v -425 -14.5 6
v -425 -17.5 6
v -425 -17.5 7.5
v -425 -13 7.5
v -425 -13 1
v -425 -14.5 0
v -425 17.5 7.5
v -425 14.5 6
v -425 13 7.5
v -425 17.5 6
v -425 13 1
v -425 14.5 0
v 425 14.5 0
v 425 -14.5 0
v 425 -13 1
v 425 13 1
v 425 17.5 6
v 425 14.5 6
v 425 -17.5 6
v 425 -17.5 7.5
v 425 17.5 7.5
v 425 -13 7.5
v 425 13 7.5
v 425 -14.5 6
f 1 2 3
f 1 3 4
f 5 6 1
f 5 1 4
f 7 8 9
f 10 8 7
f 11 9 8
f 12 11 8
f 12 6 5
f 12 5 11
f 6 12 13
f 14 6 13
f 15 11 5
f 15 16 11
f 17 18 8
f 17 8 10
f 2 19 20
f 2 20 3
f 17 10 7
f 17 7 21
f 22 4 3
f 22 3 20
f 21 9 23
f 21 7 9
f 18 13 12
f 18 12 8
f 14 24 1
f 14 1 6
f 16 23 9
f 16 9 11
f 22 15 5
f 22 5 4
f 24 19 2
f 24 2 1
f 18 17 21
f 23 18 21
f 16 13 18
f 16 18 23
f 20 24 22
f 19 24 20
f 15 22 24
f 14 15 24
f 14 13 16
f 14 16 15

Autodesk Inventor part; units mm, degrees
ref_plane "YZ Plane" through (0, 0, 0) normal (1, 0, 0) x (0, 1, 0)
ref_plane "XZ Plane" through (0, 0, 0) normal (0, 1, 0) x (-1, 0, 0)
ref_plane "XY Plane" through (0, 0, 0) normal (0, 0, 1) x (1, 0, 0)
sketch "草圖1" plane through (0, 0, 0) normal (0, 0, 1) x (1, 0, 0)
  line L0 (-425, 17.5) -> (425, 17.5)
  line L1 (425, 17.5) -> (425, -17.5)
  line L2 (425, -17.5) -> (-425, -17.5)
  line L3 (-425, -17.5) -> (-425, 17.5)
  point P0 (0, 0)
  dimension "d0" = 850
  dimension "d1" = 35
  dimension "d2" = 17.5
  dimension "d3" = 425
extrude "擠出1" add sketch "草圖1" along normal blind 7.5
sketch "草圖2" plane through (425, -17.5, 0) normal (1, 0, 0) x (0, 0, -1)
  line L0 (0, 35) -> (-7.5, 35) projected
  line L1 (0, 0) -> (0, 35) projected
  line L2 (-6, 35) -> (0, 35)
  line L3 (0, 35) -> (0, 32)
  line L4 (0, 32) -> (-6, 32)
  line L5 (-6, 32) -> (-6, 35)
  line L6 (-6, 3) -> (0, 3)
  line L7 (0, 3) -> (0, 0)
  line L8 (0, 0) -> (-6, 0)
  line L9 (-6, 0) -> (-6, 3)
  line L10 (-7.5, 35) -> (-7.5, 0) projected
  line L11 (-7.5, 30.5) -> (-1, 30.5)
  line L12 (-1, 30.5) -> (-1, 4.5)
  line L13 (-1, 4.5) -> (-7.5, 4.5)
  line L14 (-7.5, 4.5) -> (-7.5, 30.5)
  point P0 (0, 17.5)
  dimension "d6" = 6
  dimension "d7" = 3
  dimension "d8" = 26
  dimension "d9" = 1
  dimension "d10" = 13
extrude "擠出2" cut sketch "草圖2" against normal blind 850
properties part number "鋁軌"
